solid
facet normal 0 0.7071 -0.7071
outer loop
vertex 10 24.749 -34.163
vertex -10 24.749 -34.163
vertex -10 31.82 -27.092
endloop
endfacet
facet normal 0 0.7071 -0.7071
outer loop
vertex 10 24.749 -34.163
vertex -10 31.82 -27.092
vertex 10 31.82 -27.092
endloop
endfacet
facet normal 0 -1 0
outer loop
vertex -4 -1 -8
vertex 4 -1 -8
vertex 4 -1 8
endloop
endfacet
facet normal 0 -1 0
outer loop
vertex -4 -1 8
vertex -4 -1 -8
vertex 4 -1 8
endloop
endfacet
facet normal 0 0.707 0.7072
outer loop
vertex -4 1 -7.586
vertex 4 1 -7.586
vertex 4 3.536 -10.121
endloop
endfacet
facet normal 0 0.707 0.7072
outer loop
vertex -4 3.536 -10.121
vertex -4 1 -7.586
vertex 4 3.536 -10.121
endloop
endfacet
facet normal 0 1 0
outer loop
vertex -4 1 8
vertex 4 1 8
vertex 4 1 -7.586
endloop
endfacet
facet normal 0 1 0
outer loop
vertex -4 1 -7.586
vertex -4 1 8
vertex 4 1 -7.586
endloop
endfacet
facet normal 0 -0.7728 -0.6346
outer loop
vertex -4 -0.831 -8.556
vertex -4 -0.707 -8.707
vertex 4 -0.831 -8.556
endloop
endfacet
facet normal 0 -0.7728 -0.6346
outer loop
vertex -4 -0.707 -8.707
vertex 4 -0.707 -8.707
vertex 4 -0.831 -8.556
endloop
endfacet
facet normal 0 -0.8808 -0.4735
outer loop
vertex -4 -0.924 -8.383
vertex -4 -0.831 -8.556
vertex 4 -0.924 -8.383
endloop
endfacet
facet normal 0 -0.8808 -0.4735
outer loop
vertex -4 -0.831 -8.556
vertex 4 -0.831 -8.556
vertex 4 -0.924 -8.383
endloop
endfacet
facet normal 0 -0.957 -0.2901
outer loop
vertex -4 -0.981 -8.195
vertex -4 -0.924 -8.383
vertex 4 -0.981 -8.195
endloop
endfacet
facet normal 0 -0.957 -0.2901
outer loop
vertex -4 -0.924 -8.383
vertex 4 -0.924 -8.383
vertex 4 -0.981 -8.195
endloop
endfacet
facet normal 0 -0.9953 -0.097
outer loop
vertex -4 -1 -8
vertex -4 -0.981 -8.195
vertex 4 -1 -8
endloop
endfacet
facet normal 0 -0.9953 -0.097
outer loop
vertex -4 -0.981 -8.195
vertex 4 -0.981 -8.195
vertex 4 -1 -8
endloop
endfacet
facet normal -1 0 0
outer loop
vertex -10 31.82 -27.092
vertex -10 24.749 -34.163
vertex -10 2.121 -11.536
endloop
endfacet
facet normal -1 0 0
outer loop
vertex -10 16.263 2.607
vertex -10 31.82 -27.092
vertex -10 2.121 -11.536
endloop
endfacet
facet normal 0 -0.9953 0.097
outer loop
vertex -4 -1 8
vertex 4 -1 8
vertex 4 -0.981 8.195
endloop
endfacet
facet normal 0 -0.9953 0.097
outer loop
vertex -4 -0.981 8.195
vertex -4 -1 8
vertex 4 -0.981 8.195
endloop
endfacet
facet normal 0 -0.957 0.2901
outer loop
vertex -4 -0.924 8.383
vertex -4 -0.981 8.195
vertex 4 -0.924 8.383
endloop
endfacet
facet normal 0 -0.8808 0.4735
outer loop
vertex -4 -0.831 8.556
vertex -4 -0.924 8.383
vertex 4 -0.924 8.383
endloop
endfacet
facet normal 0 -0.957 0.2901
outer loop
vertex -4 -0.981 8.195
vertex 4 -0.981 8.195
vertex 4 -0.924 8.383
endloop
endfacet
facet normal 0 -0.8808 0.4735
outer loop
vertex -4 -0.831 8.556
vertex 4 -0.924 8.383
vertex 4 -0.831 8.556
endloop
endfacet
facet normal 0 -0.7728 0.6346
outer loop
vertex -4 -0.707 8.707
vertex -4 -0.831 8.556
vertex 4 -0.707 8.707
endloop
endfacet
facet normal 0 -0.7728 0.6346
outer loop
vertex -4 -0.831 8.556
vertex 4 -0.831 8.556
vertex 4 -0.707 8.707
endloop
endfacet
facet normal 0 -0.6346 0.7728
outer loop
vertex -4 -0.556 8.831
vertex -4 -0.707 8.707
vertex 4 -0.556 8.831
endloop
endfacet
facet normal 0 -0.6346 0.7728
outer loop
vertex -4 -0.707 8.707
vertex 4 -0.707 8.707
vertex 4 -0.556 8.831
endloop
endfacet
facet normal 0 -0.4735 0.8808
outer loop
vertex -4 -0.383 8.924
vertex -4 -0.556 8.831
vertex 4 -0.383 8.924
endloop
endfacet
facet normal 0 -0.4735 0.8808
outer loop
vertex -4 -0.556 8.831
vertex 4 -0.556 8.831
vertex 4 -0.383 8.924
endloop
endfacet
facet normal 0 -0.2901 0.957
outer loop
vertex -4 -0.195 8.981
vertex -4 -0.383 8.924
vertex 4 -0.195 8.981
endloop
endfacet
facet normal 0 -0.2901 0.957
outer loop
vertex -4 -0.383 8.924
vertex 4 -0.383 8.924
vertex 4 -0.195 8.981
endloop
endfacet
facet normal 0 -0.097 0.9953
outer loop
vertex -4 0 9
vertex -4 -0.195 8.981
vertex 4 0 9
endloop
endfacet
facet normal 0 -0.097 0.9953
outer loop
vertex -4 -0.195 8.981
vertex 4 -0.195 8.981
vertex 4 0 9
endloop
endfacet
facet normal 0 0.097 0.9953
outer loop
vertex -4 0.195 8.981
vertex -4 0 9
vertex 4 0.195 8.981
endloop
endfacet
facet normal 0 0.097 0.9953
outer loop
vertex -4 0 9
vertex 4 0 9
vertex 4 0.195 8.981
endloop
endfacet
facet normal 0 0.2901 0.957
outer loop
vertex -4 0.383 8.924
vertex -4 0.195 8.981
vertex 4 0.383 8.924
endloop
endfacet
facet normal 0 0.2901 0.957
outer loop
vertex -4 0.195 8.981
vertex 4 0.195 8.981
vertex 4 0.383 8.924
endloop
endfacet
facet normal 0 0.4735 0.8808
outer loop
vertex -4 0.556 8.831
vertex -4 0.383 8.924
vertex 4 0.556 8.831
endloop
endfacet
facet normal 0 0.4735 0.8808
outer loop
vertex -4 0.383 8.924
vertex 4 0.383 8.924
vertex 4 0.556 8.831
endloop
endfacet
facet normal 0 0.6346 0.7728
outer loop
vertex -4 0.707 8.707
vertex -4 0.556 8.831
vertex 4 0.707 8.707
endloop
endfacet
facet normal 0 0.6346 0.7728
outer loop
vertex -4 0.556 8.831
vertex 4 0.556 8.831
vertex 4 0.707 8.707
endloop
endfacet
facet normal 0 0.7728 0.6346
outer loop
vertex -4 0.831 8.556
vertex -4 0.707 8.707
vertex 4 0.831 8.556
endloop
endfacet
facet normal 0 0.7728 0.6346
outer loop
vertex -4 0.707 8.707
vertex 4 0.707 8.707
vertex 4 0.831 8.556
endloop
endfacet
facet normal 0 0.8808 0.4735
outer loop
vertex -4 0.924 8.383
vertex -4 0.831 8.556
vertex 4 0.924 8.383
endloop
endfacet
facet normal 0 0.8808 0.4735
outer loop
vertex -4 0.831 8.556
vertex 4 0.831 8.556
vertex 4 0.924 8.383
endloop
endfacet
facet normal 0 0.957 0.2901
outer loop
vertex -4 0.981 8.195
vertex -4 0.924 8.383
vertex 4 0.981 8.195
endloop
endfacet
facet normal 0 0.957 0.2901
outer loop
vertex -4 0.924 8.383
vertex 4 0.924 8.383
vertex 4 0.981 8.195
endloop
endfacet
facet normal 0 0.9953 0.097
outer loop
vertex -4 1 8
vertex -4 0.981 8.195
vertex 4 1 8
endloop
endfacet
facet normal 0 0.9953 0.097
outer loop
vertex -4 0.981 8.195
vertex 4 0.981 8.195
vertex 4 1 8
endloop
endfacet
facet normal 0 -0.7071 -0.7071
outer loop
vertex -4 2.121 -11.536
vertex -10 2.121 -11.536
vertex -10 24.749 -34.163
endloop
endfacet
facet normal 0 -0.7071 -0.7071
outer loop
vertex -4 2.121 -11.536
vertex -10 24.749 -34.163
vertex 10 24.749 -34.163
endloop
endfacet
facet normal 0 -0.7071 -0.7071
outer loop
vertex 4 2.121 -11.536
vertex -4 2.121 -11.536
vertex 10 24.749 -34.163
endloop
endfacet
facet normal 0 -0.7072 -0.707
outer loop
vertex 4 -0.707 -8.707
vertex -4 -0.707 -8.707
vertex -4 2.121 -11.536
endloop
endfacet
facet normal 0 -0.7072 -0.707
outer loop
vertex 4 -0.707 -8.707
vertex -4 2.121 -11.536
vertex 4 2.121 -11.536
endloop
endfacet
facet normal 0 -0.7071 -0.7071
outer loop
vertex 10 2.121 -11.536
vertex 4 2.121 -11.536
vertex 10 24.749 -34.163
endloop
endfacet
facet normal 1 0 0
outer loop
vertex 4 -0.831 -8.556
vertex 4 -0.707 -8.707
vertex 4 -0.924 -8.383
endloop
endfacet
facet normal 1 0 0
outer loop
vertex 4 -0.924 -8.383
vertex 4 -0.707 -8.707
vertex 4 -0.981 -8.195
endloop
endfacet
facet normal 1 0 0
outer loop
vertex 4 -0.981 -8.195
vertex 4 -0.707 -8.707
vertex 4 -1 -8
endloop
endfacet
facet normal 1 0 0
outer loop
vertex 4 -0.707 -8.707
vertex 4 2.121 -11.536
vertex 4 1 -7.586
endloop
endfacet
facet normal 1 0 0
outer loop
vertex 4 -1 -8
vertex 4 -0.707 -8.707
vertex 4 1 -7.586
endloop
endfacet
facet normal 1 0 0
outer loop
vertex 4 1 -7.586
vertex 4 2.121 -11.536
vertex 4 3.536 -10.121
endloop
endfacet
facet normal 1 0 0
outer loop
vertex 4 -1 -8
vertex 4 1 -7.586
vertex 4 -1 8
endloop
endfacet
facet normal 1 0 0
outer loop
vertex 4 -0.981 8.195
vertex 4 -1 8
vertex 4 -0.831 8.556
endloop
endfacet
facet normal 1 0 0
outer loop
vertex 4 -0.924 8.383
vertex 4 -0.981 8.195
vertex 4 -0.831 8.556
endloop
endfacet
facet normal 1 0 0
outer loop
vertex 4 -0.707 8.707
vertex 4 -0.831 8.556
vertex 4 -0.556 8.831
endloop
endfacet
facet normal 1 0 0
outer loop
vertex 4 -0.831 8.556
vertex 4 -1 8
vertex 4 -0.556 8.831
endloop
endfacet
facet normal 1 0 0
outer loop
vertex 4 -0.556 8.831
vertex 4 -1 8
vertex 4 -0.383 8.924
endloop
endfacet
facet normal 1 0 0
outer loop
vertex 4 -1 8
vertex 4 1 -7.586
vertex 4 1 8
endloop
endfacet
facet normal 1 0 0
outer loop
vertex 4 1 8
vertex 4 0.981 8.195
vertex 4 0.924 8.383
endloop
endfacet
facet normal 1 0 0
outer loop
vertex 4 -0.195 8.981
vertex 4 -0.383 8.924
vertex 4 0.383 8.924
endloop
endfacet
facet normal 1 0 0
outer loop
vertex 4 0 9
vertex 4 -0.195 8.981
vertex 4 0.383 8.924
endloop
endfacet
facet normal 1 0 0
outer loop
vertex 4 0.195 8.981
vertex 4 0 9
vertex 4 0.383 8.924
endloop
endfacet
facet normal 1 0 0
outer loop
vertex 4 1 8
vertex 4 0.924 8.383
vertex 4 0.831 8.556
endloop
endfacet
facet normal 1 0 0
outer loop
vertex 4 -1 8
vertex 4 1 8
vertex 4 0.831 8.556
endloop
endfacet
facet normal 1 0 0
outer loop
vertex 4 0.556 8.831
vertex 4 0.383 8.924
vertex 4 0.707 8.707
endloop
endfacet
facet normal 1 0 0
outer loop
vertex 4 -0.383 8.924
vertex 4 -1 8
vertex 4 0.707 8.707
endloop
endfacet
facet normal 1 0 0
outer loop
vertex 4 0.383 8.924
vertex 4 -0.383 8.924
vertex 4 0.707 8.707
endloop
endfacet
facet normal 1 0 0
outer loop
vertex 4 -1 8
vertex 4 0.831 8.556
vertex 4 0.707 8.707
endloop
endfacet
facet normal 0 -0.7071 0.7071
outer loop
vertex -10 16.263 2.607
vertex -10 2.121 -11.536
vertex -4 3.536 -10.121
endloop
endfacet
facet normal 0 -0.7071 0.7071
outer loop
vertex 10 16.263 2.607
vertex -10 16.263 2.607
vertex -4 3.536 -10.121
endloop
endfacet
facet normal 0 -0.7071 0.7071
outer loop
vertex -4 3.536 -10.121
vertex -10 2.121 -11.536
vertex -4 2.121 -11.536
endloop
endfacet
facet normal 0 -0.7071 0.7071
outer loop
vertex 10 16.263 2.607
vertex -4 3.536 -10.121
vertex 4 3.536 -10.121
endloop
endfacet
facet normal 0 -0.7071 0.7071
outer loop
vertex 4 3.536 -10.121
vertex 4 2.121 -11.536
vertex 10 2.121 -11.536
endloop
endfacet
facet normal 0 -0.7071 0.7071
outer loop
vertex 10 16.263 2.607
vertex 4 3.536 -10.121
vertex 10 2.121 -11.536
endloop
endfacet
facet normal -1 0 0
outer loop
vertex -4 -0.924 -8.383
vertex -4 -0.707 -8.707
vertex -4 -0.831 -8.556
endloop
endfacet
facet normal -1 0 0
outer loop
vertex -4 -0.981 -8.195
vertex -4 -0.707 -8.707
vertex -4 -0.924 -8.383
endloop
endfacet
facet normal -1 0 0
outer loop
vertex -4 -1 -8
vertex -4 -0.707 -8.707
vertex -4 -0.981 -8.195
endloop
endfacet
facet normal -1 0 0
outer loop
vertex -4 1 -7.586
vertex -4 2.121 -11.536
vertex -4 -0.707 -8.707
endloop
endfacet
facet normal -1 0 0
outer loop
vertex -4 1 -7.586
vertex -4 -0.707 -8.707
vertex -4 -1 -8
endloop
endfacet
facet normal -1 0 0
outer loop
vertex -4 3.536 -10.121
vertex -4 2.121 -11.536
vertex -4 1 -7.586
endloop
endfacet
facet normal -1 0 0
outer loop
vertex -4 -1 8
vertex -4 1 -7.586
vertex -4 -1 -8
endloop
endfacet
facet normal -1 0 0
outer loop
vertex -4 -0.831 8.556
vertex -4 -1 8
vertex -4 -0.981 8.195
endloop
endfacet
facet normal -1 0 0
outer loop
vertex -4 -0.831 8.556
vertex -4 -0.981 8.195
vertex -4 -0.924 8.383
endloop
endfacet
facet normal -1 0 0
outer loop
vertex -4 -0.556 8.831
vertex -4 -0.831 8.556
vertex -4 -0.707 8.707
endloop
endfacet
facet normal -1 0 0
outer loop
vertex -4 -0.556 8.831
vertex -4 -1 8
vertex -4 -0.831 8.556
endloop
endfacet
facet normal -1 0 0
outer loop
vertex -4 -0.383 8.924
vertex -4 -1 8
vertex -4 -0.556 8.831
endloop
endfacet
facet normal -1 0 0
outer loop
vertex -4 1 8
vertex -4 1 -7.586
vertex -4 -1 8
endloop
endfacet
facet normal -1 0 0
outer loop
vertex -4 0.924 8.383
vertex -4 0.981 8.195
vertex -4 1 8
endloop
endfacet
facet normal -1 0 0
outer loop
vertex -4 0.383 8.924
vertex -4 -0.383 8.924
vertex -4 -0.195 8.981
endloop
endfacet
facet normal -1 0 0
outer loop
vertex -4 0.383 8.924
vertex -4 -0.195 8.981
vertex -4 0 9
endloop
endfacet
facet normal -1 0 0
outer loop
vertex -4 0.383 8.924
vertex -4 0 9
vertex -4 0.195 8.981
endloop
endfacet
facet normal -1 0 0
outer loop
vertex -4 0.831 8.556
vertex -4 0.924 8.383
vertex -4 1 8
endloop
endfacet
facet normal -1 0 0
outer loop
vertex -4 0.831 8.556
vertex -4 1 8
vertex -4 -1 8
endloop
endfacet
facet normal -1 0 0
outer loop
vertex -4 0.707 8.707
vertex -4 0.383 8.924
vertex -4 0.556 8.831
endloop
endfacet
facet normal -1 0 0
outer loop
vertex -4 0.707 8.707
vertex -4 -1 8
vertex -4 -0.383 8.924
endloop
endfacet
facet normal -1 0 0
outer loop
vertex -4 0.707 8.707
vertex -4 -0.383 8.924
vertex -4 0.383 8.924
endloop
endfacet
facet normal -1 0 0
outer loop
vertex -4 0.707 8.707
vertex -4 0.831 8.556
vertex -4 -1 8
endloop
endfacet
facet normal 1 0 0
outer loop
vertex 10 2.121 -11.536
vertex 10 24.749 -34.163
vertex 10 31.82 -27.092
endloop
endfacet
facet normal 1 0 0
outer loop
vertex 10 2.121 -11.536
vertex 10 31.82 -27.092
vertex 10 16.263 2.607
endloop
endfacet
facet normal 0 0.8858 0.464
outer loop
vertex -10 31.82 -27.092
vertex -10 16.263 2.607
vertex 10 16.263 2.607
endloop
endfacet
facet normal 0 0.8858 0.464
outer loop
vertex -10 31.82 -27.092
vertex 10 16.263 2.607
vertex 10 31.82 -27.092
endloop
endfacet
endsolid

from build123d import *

# Parameters (mm, degrees)
EXTRUDE_2_DEPTH     = 4
SKETCH_5_W          = 20
SKETCH_5_H          = 32
EXTRUDE_5_DEPTH     = 20
CUT_EXTRUDE_3_DEPTH = 20


with BuildPart() as part:
    # 草图1 → 凸台-拉伸2 (new body, symmetric)
    with BuildSketch(Plane(origin=(0, 0, 0), x_dir=(0, 0, -1), z_dir=(1, 0, 0))):
        with BuildLine():
            Line((-8, 1), (7.585786438, 1))
            Line((7.585786438, 1), (27.091883092, 20.506096654))
            ThreePointArc((27.091883092, 20.506096654), (28.506096654, 20.506096654), (28.506096654, 19.091883092))
            Line((28.506096654, 19.091883092), (8.707106781, -0.707106781))
            ThreePointArc((8.707106781, -0.707106781), (8.382683432, -0.923879533), (8, -1))
            Line((8, -1), (-8, -1))
            ThreePointArc((-8, -1), (-9, 0), (-8, 1))
        make_face()
    extrude(amount=EXTRUDE_2_DEPTH, both=True)

    # 草图5 → 凸台-拉伸5 (add)
    with BuildSketch(Plane(origin=(0, -4.707106781, -4.707106781), x_dir=(1, 0, 0), z_dir=(0, -0.707106781, -0.707106781))):
        with Locations((0, -25.656854249)):
            Rectangle(SKETCH_5_W, SKETCH_5_H)
    extrude(amount=-EXTRUDE_5_DEPTH)

    # 草图6 → 切除-拉伸3 (cut)
    with BuildSketch(Plane.ZY.offset(10)):
        Polygon((2.606601718, 16.263455967), (-27.091883092, 31.819805153), (-20.02081528, 38.890872965), align=None)
    extrude(amount=-CUT_EXTRUDE_3_DEPTH, mode=Mode.SUBTRACT)


solid = part.part
